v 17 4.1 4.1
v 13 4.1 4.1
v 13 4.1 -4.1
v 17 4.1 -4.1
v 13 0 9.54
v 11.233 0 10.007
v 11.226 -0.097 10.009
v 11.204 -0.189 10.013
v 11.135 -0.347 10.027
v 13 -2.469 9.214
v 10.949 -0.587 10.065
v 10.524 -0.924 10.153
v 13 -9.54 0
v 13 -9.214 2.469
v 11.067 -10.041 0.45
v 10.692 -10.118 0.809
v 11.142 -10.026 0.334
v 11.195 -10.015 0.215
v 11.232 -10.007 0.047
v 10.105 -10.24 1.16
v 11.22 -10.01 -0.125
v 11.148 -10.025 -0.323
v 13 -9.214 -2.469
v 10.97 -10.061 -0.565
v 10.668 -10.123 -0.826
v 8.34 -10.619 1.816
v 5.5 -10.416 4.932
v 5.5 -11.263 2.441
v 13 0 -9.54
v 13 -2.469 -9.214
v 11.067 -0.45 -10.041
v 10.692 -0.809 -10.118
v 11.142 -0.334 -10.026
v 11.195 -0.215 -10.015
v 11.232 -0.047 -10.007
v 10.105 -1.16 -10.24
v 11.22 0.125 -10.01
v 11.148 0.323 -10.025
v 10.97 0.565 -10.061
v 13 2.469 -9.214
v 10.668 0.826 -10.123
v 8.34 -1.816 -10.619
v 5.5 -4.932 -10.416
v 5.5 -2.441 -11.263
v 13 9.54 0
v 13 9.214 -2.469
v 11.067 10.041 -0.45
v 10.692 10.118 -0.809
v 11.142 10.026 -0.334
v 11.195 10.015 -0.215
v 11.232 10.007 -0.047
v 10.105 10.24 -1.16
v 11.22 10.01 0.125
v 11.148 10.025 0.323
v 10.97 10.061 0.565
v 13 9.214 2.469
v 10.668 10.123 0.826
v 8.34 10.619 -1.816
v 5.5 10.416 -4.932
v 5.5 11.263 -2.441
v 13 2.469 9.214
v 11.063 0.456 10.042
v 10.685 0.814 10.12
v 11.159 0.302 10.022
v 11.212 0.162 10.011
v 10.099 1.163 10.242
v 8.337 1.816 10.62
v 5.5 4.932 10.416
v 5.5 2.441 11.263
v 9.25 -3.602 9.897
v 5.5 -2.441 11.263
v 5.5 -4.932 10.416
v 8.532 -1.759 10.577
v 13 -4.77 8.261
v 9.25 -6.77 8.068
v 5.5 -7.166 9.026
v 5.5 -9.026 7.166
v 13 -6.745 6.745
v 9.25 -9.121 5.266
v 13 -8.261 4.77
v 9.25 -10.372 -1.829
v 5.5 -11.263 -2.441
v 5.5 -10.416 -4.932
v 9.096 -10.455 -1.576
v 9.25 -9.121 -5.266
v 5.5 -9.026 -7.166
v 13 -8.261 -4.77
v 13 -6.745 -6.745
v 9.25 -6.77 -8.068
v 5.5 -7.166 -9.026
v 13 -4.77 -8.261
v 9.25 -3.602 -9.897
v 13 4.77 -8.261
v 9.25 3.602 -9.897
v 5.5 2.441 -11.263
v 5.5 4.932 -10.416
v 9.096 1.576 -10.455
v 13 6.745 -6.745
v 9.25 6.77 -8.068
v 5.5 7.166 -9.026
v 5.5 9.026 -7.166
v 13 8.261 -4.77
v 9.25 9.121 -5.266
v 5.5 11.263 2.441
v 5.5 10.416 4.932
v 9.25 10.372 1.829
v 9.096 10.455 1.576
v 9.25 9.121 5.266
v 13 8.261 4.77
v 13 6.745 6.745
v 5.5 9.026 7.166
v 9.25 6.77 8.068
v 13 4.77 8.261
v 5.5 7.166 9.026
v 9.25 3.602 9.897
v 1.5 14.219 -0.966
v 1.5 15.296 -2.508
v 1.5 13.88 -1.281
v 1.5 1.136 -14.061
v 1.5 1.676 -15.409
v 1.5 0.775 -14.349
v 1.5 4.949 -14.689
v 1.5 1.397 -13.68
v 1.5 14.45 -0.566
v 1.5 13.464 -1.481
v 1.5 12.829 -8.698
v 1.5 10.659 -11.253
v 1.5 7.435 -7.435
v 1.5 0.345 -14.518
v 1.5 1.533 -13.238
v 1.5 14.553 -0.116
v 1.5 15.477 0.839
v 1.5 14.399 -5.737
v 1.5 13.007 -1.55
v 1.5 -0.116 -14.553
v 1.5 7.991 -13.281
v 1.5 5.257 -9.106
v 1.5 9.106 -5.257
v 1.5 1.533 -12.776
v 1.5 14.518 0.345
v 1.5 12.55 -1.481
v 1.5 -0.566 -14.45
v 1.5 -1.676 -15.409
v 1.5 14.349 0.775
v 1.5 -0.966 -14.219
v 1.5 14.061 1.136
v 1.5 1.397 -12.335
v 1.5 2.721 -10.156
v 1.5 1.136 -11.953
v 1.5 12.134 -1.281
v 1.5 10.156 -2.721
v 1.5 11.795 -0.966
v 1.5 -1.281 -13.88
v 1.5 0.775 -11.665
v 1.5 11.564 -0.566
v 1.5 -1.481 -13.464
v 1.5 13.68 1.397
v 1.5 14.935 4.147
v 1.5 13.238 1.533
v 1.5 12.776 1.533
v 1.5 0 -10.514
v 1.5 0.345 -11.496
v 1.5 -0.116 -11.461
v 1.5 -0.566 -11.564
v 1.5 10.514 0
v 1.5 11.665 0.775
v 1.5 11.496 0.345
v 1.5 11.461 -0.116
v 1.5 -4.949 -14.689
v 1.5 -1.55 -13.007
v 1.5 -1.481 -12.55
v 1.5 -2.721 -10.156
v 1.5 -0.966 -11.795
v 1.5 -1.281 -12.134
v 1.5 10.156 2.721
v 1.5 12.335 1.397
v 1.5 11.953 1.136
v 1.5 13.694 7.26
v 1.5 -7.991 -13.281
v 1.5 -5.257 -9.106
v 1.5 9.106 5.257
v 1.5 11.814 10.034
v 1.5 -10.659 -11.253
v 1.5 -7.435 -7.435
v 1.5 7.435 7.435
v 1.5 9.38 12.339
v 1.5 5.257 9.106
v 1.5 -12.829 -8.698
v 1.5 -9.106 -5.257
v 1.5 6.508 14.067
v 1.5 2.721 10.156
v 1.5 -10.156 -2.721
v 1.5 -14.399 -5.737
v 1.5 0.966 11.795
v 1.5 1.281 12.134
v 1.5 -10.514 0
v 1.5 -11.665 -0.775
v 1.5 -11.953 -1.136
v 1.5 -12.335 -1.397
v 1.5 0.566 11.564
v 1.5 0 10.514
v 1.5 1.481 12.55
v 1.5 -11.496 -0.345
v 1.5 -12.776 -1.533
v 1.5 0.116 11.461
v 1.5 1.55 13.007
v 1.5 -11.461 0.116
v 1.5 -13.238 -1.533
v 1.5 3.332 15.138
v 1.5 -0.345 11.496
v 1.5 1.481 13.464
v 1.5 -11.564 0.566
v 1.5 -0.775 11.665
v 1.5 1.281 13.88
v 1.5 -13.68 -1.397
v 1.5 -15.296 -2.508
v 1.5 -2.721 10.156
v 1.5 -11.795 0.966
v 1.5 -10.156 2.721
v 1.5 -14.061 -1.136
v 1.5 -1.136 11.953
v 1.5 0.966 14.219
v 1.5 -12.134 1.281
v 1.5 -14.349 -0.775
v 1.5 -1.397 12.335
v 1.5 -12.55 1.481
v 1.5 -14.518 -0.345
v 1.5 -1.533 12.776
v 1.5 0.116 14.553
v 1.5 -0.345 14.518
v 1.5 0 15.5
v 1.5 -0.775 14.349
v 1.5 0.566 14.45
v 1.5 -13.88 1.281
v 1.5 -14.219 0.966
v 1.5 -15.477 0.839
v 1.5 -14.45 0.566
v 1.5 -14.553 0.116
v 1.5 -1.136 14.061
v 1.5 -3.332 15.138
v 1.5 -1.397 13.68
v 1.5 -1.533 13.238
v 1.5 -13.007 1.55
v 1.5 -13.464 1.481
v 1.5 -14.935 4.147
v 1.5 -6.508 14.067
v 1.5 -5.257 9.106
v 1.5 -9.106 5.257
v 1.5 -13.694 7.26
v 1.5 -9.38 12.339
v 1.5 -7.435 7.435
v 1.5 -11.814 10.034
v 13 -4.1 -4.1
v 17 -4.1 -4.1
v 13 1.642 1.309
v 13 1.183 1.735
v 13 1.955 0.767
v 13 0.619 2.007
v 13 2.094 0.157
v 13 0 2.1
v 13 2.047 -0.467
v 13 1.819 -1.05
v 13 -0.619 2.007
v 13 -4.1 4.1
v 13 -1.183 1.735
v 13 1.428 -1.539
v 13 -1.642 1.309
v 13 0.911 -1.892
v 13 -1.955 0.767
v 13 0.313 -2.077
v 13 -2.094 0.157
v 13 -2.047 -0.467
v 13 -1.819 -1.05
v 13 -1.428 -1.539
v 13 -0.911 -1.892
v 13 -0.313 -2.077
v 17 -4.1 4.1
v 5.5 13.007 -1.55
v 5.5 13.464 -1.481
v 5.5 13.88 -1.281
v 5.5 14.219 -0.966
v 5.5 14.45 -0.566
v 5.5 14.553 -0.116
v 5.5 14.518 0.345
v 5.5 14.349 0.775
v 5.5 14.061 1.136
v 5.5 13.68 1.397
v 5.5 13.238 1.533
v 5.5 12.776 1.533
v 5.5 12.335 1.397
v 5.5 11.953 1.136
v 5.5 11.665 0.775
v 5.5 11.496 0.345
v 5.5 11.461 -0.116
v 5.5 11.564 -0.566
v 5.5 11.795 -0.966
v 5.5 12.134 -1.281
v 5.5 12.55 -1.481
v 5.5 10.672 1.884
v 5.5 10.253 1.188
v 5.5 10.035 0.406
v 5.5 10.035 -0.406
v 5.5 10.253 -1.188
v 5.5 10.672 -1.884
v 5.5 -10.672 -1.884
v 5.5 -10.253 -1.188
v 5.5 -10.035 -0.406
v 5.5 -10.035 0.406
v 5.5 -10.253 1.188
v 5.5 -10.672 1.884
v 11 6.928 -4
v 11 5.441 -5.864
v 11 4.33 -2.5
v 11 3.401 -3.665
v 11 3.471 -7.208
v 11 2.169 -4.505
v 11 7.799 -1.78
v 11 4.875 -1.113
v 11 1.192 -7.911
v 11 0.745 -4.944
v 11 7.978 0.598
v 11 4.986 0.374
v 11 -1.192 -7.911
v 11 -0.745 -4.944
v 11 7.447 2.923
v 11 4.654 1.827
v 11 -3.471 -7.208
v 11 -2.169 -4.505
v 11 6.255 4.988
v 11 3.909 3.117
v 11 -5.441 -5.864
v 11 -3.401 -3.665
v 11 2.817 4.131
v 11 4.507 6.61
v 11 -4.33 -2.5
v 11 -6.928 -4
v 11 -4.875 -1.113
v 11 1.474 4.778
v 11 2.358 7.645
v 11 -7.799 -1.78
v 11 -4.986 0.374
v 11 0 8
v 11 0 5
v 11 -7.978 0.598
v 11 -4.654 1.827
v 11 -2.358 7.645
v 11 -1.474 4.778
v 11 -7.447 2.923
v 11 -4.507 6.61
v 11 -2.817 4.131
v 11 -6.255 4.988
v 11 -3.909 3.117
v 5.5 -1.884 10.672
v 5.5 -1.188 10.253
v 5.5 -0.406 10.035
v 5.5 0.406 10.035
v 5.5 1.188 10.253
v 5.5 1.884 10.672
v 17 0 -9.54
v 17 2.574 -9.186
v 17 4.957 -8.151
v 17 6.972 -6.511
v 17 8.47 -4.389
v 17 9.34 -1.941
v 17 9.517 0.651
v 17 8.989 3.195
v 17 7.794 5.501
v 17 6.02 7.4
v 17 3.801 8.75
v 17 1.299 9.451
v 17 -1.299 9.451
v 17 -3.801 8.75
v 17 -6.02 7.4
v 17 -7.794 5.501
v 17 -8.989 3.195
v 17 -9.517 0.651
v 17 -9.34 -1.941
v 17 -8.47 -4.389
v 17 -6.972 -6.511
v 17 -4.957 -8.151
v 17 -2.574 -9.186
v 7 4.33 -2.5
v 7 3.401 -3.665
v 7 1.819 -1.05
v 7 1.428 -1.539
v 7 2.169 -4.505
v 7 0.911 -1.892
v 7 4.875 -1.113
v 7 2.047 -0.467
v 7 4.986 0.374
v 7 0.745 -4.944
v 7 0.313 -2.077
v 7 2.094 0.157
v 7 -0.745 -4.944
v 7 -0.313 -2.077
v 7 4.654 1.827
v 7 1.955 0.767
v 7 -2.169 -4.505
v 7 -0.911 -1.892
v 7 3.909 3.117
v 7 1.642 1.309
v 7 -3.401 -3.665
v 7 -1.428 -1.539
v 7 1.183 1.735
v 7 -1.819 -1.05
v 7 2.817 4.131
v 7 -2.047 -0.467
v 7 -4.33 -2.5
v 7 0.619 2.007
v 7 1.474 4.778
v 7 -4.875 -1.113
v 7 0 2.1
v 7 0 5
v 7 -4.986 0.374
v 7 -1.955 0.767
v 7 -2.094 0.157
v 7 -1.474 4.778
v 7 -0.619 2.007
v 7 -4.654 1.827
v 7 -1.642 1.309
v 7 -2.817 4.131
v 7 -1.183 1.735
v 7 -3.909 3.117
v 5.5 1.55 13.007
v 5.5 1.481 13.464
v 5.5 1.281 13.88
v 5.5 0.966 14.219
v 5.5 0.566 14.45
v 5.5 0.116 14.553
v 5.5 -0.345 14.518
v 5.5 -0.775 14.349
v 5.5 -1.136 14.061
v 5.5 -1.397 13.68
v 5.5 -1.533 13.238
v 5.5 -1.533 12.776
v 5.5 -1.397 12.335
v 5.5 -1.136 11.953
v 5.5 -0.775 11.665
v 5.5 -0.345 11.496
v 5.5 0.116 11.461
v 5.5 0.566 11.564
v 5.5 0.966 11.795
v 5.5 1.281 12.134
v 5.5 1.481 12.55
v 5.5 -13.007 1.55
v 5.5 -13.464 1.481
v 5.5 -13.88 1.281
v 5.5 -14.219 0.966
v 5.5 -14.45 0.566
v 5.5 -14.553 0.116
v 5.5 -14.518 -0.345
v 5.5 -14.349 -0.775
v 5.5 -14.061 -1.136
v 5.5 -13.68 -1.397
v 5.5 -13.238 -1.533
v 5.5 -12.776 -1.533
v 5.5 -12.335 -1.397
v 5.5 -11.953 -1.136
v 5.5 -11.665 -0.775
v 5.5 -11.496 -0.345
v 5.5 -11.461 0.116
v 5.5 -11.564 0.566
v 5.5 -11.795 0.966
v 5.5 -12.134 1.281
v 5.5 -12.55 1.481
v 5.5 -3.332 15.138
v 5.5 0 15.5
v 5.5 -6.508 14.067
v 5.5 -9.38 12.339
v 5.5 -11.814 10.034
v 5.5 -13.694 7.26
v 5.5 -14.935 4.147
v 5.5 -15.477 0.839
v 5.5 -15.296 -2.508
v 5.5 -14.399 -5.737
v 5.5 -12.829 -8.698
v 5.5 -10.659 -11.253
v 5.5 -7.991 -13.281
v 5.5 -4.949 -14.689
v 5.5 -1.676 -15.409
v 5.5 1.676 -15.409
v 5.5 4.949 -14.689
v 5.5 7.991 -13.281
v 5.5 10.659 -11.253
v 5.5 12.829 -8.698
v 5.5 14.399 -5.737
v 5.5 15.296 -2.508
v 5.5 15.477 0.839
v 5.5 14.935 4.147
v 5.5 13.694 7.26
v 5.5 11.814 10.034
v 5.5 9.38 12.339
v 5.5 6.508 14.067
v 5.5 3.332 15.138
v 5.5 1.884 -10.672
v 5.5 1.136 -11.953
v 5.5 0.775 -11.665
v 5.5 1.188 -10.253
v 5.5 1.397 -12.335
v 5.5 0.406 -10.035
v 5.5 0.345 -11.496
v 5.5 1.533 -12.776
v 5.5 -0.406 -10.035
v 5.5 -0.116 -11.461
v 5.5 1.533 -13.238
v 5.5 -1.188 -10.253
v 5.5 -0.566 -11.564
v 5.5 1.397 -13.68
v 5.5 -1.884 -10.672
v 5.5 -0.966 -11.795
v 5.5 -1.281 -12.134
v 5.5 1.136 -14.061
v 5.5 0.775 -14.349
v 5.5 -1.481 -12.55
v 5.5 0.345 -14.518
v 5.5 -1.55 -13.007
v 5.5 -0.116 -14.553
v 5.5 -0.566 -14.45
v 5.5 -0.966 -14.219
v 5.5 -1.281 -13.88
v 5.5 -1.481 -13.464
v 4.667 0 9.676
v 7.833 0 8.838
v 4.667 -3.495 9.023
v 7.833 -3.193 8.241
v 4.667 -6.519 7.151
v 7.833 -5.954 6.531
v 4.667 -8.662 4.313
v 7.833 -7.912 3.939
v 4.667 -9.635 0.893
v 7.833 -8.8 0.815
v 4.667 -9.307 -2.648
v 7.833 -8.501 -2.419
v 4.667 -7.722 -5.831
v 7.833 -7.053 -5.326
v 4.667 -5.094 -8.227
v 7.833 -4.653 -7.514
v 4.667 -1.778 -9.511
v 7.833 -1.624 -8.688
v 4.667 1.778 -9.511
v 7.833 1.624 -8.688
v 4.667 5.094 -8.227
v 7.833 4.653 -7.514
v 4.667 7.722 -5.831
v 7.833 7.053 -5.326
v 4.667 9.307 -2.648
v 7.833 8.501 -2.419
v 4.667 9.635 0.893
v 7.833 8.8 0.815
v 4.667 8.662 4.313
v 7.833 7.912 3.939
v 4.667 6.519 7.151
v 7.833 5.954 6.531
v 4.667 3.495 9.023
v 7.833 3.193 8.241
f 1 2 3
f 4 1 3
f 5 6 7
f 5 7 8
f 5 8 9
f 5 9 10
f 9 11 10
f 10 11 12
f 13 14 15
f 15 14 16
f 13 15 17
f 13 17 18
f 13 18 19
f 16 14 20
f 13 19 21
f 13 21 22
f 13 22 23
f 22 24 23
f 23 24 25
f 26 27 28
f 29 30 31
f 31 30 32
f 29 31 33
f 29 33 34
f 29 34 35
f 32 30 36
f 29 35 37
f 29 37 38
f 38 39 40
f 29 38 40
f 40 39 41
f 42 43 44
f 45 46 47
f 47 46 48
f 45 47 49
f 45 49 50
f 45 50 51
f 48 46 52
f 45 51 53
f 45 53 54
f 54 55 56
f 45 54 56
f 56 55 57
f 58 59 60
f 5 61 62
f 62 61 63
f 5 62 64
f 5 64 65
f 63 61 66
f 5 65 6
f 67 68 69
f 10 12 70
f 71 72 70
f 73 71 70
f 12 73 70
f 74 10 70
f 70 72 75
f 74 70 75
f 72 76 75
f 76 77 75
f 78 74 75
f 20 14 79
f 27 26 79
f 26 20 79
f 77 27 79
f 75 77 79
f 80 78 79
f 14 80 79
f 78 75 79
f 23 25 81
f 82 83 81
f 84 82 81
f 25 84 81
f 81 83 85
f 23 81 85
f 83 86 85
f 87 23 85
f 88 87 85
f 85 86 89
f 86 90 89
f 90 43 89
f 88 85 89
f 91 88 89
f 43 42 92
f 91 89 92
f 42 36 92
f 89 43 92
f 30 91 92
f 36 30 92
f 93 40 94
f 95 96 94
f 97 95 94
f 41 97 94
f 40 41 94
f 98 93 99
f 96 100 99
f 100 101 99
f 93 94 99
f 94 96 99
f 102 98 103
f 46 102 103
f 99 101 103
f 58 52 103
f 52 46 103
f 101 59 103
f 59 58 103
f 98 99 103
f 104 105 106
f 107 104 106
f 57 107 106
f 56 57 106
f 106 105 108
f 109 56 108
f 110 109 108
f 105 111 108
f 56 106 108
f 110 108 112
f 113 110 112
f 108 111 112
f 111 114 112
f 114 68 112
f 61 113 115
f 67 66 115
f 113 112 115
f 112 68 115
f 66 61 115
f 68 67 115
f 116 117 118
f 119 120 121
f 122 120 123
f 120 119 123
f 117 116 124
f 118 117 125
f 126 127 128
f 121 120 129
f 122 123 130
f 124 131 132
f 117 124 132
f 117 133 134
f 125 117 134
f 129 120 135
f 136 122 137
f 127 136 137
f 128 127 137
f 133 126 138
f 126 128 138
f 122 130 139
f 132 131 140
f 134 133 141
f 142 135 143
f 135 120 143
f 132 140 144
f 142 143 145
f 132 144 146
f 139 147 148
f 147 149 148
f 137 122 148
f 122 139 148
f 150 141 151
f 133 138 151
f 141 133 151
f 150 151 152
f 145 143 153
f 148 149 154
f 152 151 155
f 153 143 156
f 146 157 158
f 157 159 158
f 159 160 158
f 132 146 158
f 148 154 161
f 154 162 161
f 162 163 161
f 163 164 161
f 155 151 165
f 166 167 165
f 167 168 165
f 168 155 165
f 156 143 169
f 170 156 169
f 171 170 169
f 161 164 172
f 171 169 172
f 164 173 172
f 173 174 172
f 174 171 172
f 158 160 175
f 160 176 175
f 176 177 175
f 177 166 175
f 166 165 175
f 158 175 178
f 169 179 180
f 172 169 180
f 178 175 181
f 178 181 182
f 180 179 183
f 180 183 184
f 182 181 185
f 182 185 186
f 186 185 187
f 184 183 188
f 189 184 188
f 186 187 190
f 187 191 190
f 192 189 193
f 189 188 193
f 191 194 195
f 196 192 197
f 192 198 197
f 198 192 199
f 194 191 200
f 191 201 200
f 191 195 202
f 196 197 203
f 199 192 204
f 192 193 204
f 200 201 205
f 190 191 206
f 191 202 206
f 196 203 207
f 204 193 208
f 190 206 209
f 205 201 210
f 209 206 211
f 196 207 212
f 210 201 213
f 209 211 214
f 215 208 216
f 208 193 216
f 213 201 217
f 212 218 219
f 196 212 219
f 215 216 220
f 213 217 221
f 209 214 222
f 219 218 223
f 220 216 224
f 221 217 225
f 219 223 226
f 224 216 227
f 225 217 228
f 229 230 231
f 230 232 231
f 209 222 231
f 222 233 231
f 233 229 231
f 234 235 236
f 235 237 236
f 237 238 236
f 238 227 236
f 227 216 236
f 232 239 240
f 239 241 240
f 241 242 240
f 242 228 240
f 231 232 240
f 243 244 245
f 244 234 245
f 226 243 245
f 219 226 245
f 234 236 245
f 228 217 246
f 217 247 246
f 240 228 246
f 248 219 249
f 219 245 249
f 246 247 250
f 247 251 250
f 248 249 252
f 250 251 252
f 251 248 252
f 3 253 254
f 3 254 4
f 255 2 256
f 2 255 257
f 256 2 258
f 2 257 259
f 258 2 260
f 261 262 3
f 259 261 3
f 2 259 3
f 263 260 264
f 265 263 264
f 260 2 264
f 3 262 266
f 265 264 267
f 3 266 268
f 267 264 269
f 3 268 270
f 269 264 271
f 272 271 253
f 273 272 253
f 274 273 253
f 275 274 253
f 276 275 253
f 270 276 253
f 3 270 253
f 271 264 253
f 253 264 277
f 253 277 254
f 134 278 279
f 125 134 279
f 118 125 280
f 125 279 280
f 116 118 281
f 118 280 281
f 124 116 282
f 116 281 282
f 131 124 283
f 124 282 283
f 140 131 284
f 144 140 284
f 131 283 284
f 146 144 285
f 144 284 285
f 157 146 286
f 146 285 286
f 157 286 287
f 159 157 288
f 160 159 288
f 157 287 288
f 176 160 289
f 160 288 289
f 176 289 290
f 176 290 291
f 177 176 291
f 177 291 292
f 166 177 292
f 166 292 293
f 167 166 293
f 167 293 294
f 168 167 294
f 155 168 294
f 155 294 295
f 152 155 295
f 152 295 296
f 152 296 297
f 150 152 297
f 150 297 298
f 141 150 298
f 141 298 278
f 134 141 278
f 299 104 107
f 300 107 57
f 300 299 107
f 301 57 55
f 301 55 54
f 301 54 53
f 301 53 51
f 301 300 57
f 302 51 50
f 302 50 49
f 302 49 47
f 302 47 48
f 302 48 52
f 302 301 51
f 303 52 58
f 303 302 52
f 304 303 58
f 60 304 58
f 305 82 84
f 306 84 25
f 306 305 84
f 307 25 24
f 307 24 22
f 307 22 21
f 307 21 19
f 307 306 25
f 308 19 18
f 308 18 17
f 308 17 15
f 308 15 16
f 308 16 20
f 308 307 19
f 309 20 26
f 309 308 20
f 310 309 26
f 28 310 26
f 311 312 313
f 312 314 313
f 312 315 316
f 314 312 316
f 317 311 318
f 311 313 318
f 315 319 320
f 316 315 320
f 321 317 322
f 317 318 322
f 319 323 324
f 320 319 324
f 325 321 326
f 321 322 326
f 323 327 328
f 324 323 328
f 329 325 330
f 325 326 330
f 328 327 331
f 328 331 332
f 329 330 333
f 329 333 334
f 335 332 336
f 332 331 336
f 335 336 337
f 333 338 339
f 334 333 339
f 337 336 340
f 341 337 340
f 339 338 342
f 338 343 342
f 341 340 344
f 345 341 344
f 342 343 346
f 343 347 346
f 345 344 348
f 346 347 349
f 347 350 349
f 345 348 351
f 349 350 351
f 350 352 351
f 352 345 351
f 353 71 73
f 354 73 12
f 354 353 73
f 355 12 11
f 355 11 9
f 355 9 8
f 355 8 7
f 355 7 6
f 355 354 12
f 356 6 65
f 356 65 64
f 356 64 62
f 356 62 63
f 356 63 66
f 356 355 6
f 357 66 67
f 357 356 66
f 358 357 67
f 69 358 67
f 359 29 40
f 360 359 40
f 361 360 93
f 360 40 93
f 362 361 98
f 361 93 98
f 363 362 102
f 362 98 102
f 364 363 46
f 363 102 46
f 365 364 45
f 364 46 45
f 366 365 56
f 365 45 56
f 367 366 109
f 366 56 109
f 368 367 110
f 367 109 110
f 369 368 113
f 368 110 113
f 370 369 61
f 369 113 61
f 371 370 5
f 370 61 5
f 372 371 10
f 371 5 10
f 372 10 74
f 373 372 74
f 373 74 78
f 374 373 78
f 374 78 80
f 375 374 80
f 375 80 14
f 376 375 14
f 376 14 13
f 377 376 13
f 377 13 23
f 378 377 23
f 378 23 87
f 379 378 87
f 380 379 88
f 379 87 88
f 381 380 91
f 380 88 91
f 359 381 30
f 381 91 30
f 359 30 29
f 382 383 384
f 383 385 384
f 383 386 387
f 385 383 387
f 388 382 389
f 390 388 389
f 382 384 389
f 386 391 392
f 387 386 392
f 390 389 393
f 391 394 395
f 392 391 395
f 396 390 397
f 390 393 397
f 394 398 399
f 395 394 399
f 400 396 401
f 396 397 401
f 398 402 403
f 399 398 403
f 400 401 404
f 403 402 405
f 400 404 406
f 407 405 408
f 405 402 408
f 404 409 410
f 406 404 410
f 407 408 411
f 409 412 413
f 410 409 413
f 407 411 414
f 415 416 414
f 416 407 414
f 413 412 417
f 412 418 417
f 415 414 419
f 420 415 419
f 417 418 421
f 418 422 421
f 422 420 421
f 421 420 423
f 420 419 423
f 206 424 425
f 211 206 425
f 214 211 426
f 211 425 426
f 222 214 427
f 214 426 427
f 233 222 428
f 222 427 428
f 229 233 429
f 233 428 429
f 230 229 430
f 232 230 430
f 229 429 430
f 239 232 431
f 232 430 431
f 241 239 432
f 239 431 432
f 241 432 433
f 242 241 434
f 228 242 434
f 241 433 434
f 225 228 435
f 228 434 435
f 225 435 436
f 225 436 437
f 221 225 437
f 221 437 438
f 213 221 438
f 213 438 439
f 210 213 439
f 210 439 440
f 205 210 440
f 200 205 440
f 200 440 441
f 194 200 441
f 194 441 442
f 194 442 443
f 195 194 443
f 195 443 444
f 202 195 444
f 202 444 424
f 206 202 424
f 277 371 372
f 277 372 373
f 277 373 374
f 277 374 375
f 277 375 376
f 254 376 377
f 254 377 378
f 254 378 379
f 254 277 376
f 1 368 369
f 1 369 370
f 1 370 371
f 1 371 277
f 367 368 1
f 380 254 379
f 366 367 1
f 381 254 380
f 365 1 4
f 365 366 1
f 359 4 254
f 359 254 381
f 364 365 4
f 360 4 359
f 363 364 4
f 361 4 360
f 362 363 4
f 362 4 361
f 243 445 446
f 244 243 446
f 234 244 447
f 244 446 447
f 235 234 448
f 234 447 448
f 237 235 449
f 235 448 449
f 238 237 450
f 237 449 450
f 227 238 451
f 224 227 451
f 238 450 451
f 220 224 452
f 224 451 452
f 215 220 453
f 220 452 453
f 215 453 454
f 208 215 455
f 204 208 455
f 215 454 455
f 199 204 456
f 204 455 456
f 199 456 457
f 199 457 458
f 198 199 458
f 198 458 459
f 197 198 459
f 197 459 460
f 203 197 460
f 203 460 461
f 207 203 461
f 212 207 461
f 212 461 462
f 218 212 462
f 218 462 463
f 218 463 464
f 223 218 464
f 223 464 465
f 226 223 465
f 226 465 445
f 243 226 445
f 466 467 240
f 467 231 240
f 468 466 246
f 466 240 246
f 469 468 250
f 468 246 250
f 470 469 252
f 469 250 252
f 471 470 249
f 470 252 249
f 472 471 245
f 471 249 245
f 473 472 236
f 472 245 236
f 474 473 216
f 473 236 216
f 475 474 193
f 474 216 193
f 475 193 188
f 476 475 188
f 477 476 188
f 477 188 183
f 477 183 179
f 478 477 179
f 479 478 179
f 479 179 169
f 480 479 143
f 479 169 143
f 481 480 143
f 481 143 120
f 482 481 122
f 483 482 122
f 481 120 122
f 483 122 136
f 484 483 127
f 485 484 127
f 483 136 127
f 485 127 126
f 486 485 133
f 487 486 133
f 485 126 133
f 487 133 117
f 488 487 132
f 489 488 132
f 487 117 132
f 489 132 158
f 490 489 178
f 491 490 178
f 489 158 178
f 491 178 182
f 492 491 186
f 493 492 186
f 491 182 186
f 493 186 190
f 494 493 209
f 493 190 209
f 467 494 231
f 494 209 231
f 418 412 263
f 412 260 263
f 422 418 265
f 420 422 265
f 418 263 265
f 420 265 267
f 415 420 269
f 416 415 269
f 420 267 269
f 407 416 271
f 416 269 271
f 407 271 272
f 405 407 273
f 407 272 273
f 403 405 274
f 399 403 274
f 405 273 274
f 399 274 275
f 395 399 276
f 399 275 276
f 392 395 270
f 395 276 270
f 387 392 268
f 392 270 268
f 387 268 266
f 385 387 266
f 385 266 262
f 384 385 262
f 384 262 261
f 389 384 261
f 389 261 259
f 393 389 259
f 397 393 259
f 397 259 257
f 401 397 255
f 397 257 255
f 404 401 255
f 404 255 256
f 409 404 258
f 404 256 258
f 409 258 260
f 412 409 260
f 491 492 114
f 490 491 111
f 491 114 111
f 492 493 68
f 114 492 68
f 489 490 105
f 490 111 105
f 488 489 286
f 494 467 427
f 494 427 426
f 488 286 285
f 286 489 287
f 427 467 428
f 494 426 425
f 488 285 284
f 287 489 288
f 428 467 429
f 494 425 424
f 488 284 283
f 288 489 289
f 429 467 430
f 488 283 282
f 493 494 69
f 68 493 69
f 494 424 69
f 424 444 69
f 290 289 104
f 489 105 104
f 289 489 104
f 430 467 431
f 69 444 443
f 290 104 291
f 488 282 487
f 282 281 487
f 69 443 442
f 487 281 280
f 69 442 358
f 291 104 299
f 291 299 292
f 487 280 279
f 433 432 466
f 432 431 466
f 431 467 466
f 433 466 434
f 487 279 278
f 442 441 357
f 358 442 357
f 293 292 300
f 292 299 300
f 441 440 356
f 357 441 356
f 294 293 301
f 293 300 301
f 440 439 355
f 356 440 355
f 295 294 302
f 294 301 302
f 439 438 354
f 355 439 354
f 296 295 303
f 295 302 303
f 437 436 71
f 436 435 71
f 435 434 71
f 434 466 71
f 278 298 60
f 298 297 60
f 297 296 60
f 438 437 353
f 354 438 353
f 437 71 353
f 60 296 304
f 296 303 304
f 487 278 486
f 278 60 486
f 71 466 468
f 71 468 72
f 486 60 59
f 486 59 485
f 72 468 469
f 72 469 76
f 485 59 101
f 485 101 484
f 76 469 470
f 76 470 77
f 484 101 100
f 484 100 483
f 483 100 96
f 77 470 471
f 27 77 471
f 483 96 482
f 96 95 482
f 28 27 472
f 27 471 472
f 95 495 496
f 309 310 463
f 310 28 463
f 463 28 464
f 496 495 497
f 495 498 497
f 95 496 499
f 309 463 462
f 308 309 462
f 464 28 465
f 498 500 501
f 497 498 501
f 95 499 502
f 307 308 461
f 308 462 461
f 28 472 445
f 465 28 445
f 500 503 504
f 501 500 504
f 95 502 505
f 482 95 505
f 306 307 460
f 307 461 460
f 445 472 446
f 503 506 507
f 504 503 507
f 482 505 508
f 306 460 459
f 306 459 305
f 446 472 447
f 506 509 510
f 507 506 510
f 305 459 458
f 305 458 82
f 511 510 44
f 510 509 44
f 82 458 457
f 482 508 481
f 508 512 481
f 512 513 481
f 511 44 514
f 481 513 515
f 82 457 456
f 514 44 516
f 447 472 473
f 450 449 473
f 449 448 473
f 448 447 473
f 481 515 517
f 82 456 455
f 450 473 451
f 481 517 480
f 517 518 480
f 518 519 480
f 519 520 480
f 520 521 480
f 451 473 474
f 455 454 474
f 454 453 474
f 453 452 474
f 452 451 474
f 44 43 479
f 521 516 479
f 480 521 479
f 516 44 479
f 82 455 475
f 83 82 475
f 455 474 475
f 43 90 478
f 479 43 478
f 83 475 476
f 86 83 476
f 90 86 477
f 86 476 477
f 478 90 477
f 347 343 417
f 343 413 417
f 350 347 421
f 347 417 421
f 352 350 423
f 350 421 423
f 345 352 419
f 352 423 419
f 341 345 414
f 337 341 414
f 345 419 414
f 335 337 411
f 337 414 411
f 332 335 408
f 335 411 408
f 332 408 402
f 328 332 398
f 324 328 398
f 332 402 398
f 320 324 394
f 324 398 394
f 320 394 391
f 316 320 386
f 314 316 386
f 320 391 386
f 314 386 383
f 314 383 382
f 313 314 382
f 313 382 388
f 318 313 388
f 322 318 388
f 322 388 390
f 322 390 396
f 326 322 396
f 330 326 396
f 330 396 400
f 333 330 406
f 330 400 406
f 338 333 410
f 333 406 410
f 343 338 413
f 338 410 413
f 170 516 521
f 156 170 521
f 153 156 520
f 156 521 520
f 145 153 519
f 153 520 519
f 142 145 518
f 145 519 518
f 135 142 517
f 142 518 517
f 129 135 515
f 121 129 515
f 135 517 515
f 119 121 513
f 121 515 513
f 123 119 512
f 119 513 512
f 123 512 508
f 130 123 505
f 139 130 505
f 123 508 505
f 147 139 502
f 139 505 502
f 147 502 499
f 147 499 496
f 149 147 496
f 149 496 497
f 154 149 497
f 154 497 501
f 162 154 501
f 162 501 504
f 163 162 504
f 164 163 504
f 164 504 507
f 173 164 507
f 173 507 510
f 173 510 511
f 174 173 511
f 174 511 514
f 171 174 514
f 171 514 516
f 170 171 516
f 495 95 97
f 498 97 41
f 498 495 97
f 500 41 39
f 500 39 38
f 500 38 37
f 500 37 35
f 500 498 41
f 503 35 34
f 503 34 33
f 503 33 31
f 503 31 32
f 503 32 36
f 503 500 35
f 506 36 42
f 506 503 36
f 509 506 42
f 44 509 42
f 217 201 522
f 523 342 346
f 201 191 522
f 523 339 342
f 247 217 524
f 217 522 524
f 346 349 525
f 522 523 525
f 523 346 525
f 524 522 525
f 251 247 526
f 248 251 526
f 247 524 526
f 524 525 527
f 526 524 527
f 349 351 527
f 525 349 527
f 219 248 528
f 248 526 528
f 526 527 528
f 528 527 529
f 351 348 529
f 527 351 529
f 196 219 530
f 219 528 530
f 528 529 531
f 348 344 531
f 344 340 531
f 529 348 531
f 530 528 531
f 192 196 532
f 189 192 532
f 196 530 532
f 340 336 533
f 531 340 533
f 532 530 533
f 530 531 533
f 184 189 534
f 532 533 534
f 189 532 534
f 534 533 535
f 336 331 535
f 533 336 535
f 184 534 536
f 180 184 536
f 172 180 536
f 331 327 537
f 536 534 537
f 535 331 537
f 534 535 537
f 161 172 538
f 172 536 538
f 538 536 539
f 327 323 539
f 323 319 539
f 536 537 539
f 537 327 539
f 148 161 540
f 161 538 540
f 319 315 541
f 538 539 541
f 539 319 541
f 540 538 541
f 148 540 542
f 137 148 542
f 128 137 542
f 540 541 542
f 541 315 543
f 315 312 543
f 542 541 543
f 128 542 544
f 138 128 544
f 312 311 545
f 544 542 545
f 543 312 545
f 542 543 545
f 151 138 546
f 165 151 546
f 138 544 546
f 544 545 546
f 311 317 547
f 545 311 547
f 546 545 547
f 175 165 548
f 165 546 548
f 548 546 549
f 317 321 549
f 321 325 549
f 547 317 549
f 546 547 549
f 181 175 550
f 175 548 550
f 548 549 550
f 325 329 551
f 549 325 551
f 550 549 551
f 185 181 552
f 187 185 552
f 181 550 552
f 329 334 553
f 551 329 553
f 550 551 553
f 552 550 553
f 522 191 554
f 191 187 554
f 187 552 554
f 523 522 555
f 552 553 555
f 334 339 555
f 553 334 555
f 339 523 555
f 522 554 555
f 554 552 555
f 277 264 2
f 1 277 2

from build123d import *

# Parameters (mm, degrees)
ESQUISSE2_R                  = 9.539549542
ESQUISSE2_W                  = 8.2
ESQUISSE2_H                  = 8.2
BOSS_EXTRU_1_DEPTH           = 4
ESQUISSE3_R                  = 1.55
ENL_V_MAT_EXTRU_1_DEPTH      = 25.753787589
ESQUISSE4_R                  = 3
ENL_V_MAT_EXTRU_2_DEPTH      = 25.753787589
R_P_TITION_CIRCULAIRE1_COUNT = 4


with BuildPart() as part:
    # Esquisse1 → Révolution1 (revolve)
    with BuildSketch(Plane.XY, mode=Mode.PRIVATE) as r_volution1_sk:
        Polygon((1.5, 15.5), (1.5, 10.514205948), (11, 8), (11, 5), (7, 5), (7, 2.1), (13, 2.1), (13, 9.539549542), (5.5, 11.524448975), (5.5, 15.5), align=None)
    revolve(r_volution1_sk.sketch.rotate(Axis((0, 0, 0), (1, 0, 0)), 90), axis=Axis((0, 0, 0), (1, 0, 0)))

    # Esquisse2 → Boss.-Extru.1 (add)
    with BuildSketch(Plane(origin=(13, 0, 0), x_dir=(0, 0, -1), z_dir=(1, 0, 0))):
        Circle(ESQUISSE2_R)
        Rectangle(ESQUISSE2_W, ESQUISSE2_H, mode=Mode.SUBTRACT)
    extrude(amount=BOSS_EXTRU_1_DEPTH)

    # Esquisse3 → Enlèv. mat.-Extru.1 (cut, through all)
    with BuildSketch(Plane(origin=(5.5, 0, 0), x_dir=(0, 0, -1), z_dir=(1, 0, 0))):
        with Locations((0, 13.007102974)):
            Circle(ESQUISSE3_R)
    enl_v_mat_extru_1 = extrude(amount=-ENL_V_MAT_EXTRU_1_DEPTH, mode=Mode.SUBTRACT)

    # Esquisse4 → Enlèv. mat.-Extru.2 (cut, through all)
    with BuildSketch(Plane(origin=(5.5, 0, 0), x_dir=(0, 0, -1), z_dir=(1, 0, 0))):
        with Locations((0, 13.007102974)):
            Circle(ESQUISSE4_R)
    enl_v_mat_extru_2 = extrude(amount=ENL_V_MAT_EXTRU_2_DEPTH, mode=Mode.SUBTRACT)

    # Répétition circulaire1: Enlèv. mat.-Extru.1, Enlèv. mat.-Extru.2 ×4 about axis
    r_p_tition_circulaire1_axis = Axis((0, 0, 0), (1, 0, 0))
    add([enl_v_mat_extru_1.rotate(r_p_tition_circulaire1_axis, i * 360 / R_P_TITION_CIRCULAIRE1_COUNT) for i in range(1, R_P_TITION_CIRCULAIRE1_COUNT)], mode=Mode.SUBTRACT)
    add([enl_v_mat_extru_2.rotate(r_p_tition_circulaire1_axis, i * 360 / R_P_TITION_CIRCULAIRE1_COUNT) for i in range(1, R_P_TITION_CIRCULAIRE1_COUNT)], mode=Mode.SUBTRACT)


solid = part.part
